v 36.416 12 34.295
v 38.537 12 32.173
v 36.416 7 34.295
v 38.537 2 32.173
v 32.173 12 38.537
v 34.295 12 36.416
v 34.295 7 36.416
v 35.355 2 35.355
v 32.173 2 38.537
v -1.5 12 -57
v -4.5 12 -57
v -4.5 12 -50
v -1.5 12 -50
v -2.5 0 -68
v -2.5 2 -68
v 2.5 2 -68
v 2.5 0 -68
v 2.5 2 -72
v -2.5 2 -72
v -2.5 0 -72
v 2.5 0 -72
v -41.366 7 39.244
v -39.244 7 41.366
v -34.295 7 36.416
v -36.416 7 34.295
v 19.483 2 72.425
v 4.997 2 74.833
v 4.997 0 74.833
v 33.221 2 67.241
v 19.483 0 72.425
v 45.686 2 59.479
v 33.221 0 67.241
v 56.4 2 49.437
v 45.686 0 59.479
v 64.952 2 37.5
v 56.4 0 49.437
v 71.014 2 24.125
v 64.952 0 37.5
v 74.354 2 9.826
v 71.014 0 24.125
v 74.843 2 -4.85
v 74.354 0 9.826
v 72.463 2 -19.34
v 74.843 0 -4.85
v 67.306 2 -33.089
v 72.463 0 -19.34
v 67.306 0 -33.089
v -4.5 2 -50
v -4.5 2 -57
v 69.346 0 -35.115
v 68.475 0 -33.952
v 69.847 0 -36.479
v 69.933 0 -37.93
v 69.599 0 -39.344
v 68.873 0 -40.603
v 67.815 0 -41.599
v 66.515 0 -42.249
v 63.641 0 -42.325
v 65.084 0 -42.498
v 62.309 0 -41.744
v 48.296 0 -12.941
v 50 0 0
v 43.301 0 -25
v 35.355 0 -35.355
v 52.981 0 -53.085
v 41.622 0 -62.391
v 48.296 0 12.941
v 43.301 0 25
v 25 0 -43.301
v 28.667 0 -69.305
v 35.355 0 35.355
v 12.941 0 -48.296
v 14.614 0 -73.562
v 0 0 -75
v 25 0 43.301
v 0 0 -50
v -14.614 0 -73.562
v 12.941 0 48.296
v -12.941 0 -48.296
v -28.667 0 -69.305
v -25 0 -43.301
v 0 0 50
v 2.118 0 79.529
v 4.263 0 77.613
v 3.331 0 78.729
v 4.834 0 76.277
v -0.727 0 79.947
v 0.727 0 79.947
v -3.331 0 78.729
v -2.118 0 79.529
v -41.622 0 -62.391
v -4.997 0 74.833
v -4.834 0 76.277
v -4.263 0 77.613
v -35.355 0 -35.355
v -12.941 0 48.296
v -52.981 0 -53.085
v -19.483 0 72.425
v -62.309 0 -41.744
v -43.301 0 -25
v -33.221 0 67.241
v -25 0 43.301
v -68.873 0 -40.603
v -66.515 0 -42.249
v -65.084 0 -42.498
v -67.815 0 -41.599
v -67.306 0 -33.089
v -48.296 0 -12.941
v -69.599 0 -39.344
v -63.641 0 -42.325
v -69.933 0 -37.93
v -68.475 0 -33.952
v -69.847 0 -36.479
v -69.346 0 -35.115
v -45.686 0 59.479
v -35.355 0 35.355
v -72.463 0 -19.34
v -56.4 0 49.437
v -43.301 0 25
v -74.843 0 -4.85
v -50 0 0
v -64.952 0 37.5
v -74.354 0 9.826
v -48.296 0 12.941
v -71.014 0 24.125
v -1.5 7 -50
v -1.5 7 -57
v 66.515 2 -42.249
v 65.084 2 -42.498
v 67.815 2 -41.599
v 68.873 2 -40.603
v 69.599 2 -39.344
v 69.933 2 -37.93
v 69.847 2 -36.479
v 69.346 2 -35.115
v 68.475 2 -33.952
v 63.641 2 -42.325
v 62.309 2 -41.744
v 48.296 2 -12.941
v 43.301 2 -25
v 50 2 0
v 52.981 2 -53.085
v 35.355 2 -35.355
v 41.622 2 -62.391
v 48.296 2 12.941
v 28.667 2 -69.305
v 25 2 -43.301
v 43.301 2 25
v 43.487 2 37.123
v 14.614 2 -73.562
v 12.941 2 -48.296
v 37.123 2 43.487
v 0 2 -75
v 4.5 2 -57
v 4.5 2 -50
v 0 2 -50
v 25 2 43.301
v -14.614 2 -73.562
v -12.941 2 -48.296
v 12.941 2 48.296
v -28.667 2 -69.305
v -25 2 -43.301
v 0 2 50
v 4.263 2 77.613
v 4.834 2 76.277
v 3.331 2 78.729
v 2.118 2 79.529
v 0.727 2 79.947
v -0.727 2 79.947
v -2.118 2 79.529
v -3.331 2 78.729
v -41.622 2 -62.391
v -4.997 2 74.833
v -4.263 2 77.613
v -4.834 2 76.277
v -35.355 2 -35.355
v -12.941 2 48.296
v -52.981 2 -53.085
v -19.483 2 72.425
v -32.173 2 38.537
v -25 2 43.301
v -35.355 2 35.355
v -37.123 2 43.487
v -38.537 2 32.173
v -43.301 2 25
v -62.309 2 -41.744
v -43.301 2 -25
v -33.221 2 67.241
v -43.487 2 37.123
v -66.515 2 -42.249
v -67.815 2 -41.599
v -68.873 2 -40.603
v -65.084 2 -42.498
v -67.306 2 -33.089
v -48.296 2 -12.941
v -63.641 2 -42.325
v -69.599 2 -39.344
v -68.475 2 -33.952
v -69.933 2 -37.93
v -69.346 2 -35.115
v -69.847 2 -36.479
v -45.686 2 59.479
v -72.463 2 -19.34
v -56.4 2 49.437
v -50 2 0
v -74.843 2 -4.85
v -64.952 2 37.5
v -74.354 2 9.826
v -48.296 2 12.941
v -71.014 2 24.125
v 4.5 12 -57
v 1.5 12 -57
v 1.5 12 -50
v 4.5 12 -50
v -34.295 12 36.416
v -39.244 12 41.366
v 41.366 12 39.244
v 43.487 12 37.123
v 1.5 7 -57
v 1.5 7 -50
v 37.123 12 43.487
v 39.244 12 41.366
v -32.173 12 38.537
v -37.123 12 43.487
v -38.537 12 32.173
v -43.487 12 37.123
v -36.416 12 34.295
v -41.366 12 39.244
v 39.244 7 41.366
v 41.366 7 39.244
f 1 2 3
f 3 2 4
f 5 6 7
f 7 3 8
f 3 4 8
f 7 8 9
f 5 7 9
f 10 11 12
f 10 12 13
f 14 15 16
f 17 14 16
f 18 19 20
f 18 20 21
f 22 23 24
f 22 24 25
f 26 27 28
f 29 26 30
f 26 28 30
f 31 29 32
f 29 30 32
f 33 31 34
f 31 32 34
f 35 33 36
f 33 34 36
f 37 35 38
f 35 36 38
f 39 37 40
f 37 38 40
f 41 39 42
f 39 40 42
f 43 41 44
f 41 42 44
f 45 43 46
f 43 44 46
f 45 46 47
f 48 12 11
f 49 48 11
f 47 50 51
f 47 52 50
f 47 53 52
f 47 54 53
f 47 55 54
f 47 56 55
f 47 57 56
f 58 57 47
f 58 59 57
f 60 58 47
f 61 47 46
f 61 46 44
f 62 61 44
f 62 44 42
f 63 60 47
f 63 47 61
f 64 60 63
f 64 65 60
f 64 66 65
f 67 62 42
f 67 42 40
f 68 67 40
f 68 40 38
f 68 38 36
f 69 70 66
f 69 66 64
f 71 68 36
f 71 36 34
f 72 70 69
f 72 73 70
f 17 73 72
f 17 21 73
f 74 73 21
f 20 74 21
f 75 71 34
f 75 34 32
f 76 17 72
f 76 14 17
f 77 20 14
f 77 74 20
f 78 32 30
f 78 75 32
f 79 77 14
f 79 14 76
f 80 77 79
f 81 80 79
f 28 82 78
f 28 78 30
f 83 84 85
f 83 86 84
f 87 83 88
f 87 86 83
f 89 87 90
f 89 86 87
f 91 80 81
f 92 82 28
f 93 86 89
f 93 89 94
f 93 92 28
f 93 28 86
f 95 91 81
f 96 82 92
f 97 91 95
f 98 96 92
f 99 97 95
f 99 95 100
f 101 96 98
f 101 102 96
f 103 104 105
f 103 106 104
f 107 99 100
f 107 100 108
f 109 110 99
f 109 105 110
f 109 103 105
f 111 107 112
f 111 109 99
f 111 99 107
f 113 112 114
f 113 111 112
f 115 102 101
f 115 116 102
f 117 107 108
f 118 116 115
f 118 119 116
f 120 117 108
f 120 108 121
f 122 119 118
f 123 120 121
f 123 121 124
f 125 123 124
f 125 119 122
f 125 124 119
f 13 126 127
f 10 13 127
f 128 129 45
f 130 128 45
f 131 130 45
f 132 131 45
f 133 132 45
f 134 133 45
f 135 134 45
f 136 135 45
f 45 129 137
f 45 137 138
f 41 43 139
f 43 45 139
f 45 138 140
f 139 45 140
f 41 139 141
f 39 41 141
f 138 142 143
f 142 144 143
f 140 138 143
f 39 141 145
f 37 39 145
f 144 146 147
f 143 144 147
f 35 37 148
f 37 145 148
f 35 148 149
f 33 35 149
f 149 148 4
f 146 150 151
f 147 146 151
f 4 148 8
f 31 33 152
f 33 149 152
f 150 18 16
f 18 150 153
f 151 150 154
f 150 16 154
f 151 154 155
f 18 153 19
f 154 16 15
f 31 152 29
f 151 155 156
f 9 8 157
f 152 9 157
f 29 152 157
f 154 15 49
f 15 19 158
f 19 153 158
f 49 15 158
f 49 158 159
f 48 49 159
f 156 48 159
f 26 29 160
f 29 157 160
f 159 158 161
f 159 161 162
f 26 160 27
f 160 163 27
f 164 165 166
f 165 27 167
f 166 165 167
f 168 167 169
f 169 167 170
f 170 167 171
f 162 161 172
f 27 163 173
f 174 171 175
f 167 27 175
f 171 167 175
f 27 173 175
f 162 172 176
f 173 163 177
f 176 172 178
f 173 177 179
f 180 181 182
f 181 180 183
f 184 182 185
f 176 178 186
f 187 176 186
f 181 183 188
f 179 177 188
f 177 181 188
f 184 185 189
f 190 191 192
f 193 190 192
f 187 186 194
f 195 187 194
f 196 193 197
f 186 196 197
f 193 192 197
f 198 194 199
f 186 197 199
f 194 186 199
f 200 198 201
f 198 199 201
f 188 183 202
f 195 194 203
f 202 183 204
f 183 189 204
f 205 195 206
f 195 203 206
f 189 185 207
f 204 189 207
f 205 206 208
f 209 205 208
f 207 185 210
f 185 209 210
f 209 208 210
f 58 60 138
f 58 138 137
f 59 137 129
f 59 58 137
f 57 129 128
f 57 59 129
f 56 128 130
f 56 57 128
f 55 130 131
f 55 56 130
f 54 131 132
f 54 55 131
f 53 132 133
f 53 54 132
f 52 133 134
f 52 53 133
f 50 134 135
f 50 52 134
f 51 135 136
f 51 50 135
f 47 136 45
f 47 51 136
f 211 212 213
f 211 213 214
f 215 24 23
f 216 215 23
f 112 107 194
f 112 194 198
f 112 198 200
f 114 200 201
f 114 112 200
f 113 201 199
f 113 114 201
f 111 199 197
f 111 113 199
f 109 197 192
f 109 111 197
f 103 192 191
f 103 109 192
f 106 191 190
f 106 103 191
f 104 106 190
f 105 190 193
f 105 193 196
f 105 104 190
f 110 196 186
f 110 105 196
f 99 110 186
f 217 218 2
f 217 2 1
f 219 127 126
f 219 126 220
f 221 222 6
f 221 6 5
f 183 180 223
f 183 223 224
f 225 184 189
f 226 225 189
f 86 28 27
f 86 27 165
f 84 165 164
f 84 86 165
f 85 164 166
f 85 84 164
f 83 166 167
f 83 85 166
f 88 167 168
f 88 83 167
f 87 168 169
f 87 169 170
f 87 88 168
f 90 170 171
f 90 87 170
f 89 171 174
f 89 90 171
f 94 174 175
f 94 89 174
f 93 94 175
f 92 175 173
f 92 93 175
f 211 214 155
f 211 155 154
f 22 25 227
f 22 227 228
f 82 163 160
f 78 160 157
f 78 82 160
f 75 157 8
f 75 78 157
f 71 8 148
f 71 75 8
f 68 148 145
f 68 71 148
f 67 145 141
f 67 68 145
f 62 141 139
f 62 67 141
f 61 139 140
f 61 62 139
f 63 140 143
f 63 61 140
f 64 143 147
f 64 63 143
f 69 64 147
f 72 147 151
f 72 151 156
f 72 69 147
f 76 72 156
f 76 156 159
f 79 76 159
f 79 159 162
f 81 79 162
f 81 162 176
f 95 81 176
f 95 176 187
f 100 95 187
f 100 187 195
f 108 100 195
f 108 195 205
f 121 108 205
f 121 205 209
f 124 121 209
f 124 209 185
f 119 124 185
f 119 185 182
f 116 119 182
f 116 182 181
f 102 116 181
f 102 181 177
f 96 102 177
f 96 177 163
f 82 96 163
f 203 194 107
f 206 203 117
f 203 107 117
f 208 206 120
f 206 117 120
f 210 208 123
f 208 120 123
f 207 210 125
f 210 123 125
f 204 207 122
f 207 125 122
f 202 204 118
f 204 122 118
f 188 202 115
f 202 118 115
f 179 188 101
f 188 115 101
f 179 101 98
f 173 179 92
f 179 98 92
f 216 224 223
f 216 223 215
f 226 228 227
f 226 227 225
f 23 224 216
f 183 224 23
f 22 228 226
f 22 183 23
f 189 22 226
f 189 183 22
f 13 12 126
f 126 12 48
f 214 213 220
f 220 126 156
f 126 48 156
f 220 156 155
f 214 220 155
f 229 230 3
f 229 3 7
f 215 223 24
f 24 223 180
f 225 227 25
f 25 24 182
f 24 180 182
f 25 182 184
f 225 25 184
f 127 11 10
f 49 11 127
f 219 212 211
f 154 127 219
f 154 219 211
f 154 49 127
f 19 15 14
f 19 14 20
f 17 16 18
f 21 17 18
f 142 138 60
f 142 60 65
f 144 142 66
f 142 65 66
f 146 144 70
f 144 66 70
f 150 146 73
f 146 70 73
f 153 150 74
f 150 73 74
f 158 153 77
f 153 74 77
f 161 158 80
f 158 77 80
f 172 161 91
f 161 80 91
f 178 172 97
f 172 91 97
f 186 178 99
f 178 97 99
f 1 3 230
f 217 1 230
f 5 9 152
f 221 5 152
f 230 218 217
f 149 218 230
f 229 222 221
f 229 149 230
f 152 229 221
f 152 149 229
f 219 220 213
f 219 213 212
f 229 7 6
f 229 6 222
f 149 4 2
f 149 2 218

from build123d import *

# Parameters (mm, degrees)
SKETCH1_R           = 75
SKETCH1_R_2         = 50
BOSS_EXTRUDE1_DEPTH = 2
CUT_EXTRUDE1_REACH  = 108.085
SKETCH2_W           = 5
SKETCH2_H           = 4
SKETCH4_W           = 3
SKETCH4_H           = 7
BOSS_EXTRUDE2_DEPTH = 10
SKETCH5_W           = 3
SKETCH5_H           = 7
BOSS_EXTRUDE3_DEPTH = 5
CIRPATTERN1_COUNT   = 2
CIRPATTERN1_ANGLE   = 135
CIRPATTERN2_COUNT   = 2
CIRPATTERN2_ANGLE   = 135
SKETCH6_R           = 5
BOSS_EXTRUDE4_DEPTH = 2
CIRPATTERN3_COUNT   = 3


with BuildPart() as part:
    # Sketch1 → Boss-Extrude1 (new body)
    with BuildSketch(Plane(origin=(0, 0, 0), x_dir=(1, 0, 0), z_dir=(0, 1, 0))):
        with Locations(Location((0, 0, 0), (0, 0, 270))):
            Circle(SKETCH1_R)
        with Locations(Location((0, 0, 0), (0, 0, 270))):
            Circle(SKETCH1_R_2, mode=Mode.SUBTRACT)
    extrude(amount=BOSS_EXTRUDE1_DEPTH)

    # Sketch2 → Cut-Extrude1 (cut, up to next)
    with BuildSketch(Plane(origin=(0, 2, 0), x_dir=(1, 0, 0), z_dir=(0, 1, 0)), mode=Mode.PRIVATE) as cut_extrude1_sk1:
        with Locations((0, 70)):
            Rectangle(SKETCH2_W, SKETCH2_H)
    cut_extrude1_tool1 = extrude(cut_extrude1_sk1.sketch, amount=-CUT_EXTRUDE1_REACH, mode=Mode.PRIVATE) & part.part
    add(cut_extrude1_tool1.solids().sort_by_distance((0, 2, -70))[0], mode=Mode.SUBTRACT)

    # Sketch4 → Boss-Extrude2 (add)
    with BuildSketch(Plane(origin=(0, 2, 0), x_dir=(1, 0, 0), z_dir=(0, 1, 0))):
        with Locations((3, 53.5)):
            Rectangle(SKETCH4_W, SKETCH4_H)
        with Locations((-3, 53.5)):
            Rectangle(SKETCH4_W, SKETCH4_H)
    boss_extrude2 = extrude(amount=BOSS_EXTRUDE2_DEPTH)

    # Sketch5 → Boss-Extrude3 (add)
    with BuildSketch(Plane(origin=(0, 2, 0), x_dir=(1, 0, 0), z_dir=(0, 1, 0))):
        with Locations((0, 53.5)):
            Rectangle(SKETCH5_W, SKETCH5_H)
    boss_extrude3 = extrude(amount=BOSS_EXTRUDE3_DEPTH)

    # CirPattern1: Boss-Extrude2, Boss-Extrude3 ×2 about axis
    cirpattern1_axis = Axis((0, 2, 0), (0, 1, 0))
    add([boss_extrude2.rotate(cirpattern1_axis, i * CIRPATTERN1_ANGLE / (CIRPATTERN1_COUNT - 1)) for i in range(1, CIRPATTERN1_COUNT)])
    add([boss_extrude3.rotate(cirpattern1_axis, i * CIRPATTERN1_ANGLE / (CIRPATTERN1_COUNT - 1)) for i in range(1, CIRPATTERN1_COUNT)])

    # CirPattern2: Boss-Extrude2, Boss-Extrude3 ×2 about axis
    cirpattern2_axis = Axis((0, 0, 0), (0, -1, 0))
    add([boss_extrude2.rotate(cirpattern2_axis, i * CIRPATTERN2_ANGLE / (CIRPATTERN2_COUNT - 1)) for i in range(1, CIRPATTERN2_COUNT)])
    add([boss_extrude3.rotate(cirpattern2_axis, i * CIRPATTERN2_ANGLE / (CIRPATTERN2_COUNT - 1)) for i in range(1, CIRPATTERN2_COUNT)])

    # Sketch6 → Boss-Extrude4 (add)
    with BuildSketch(Plane.XZ):
        with Locations((64.951905284, -37.5)):
            Circle(SKETCH6_R)
    boss_extrude4 = extrude(amount=-BOSS_EXTRUDE4_DEPTH)

    # CirPattern3: Boss-Extrude4 ×3 about axis
    cirpattern3_axis = Axis((0, 0, 0), (0, 1, 0))
    for i in range(1, CIRPATTERN3_COUNT):
        add(boss_extrude4.rotate(cirpattern3_axis, i * 360 / CIRPATTERN3_COUNT))


solid = part.part
